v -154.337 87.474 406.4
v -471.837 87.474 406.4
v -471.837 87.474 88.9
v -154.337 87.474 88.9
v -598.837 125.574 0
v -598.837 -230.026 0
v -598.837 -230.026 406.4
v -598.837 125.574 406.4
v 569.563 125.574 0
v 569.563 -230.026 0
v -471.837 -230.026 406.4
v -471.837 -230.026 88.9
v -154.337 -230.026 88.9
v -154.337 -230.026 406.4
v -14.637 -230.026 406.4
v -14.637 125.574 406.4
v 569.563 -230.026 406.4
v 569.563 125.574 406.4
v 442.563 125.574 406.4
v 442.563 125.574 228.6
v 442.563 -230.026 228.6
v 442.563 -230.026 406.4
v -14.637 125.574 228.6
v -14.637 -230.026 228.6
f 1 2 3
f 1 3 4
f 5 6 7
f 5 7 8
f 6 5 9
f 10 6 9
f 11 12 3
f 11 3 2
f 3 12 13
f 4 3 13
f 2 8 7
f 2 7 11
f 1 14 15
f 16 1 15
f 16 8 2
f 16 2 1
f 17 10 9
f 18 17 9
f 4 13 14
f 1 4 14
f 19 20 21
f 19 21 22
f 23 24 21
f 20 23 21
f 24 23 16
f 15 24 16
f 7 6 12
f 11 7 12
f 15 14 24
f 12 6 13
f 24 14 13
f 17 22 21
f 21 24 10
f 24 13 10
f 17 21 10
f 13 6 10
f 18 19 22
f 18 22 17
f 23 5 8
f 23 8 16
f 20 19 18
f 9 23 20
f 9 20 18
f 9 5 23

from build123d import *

# Parameters (mm, degrees)
F0_W     = 1168.4
F0_H     = 355.6
F1_DEPTH = 406.4
F2_W     = 457.2
F2_H     = 177.8
F3_DEPTH = 355.6
F2_W_2   = 317.5
F2_H_2   = 317.5
F4_DEPTH = 317.5


with BuildPart() as f1:
    # F0 (on Top) → F1 (new body)
    with BuildSketch(Plane.XY):
        with Locations((-14.636927, -52.226185)):
            Rectangle(F0_W, F0_H)
    extrude(amount=F1_DEPTH)

    # F2 (on face) → F3 (cut)
    with BuildSketch(Plane.XZ.offset(230.026185)):
        with Locations((213.963073, 317.5)):
            Rectangle(F2_W, F2_H)
    extrude(amount=-F3_DEPTH, mode=Mode.SUBTRACT)

    # F2 (on face) → F4 (cut)
    with BuildSketch(Plane.XZ.offset(230.026185)):
        with Locations((-313.086927, 247.65)):
            Rectangle(F2_W_2, F2_H_2)
    extrude(amount=-F4_DEPTH, mode=Mode.SUBTRACT)


solid = f1.part
